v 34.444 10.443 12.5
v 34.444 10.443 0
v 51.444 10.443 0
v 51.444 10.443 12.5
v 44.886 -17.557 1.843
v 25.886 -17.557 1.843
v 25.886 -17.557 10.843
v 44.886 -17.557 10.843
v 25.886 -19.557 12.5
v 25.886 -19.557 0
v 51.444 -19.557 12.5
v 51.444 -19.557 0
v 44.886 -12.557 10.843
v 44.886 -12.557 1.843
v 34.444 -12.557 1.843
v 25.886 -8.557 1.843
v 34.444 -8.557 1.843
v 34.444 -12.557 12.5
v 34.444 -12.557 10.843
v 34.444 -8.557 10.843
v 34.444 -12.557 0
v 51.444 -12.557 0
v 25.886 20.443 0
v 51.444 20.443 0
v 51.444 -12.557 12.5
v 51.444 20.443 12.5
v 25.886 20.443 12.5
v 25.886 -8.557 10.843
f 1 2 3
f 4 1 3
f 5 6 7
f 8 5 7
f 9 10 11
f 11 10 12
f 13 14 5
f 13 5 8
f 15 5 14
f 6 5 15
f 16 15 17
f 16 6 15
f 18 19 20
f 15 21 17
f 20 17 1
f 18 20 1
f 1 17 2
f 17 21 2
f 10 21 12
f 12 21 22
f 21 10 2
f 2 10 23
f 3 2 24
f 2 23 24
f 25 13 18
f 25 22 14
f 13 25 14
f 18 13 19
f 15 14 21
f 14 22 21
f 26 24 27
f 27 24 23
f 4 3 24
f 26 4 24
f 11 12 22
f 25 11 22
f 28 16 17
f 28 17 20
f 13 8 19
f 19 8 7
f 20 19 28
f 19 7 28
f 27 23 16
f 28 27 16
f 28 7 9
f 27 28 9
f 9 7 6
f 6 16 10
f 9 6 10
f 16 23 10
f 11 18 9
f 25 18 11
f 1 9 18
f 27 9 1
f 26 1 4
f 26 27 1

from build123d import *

# Parameters (mm, degrees)
BOSS_EXTRUDE1_DEPTH = 12.5
SKETCH6_W           = 9
SKETCH6_H           = 9
CUT_EXTRUDE2_DEPTH  = 19


with BuildPart() as part:
    # Sketch3 → Boss-Extrude1 (new body)
    with BuildSketch(Plane.XY):
        Polygon((51.444398057, 20.442826613), (25.886157296, 20.442826613), (25.886157296, -19.557173387), (51.444398057, -19.557173387), (51.444398057, -12.557173387), (34.444398057, -12.557173387), (34.444398057, 10.442826613), (51.444398057, 10.442826613), align=None)
    extrude(amount=BOSS_EXTRUDE1_DEPTH)

    # Sketch6 → Cut-Extrude2 (cut)
    with BuildSketch(Plane.ZY.offset(-25.886157296)):
        with Locations((6.342638548, -13.057173387)):
            Rectangle(SKETCH6_W, SKETCH6_H)
    extrude(amount=-CUT_EXTRUDE2_DEPTH, mode=Mode.SUBTRACT)


solid = part.part
